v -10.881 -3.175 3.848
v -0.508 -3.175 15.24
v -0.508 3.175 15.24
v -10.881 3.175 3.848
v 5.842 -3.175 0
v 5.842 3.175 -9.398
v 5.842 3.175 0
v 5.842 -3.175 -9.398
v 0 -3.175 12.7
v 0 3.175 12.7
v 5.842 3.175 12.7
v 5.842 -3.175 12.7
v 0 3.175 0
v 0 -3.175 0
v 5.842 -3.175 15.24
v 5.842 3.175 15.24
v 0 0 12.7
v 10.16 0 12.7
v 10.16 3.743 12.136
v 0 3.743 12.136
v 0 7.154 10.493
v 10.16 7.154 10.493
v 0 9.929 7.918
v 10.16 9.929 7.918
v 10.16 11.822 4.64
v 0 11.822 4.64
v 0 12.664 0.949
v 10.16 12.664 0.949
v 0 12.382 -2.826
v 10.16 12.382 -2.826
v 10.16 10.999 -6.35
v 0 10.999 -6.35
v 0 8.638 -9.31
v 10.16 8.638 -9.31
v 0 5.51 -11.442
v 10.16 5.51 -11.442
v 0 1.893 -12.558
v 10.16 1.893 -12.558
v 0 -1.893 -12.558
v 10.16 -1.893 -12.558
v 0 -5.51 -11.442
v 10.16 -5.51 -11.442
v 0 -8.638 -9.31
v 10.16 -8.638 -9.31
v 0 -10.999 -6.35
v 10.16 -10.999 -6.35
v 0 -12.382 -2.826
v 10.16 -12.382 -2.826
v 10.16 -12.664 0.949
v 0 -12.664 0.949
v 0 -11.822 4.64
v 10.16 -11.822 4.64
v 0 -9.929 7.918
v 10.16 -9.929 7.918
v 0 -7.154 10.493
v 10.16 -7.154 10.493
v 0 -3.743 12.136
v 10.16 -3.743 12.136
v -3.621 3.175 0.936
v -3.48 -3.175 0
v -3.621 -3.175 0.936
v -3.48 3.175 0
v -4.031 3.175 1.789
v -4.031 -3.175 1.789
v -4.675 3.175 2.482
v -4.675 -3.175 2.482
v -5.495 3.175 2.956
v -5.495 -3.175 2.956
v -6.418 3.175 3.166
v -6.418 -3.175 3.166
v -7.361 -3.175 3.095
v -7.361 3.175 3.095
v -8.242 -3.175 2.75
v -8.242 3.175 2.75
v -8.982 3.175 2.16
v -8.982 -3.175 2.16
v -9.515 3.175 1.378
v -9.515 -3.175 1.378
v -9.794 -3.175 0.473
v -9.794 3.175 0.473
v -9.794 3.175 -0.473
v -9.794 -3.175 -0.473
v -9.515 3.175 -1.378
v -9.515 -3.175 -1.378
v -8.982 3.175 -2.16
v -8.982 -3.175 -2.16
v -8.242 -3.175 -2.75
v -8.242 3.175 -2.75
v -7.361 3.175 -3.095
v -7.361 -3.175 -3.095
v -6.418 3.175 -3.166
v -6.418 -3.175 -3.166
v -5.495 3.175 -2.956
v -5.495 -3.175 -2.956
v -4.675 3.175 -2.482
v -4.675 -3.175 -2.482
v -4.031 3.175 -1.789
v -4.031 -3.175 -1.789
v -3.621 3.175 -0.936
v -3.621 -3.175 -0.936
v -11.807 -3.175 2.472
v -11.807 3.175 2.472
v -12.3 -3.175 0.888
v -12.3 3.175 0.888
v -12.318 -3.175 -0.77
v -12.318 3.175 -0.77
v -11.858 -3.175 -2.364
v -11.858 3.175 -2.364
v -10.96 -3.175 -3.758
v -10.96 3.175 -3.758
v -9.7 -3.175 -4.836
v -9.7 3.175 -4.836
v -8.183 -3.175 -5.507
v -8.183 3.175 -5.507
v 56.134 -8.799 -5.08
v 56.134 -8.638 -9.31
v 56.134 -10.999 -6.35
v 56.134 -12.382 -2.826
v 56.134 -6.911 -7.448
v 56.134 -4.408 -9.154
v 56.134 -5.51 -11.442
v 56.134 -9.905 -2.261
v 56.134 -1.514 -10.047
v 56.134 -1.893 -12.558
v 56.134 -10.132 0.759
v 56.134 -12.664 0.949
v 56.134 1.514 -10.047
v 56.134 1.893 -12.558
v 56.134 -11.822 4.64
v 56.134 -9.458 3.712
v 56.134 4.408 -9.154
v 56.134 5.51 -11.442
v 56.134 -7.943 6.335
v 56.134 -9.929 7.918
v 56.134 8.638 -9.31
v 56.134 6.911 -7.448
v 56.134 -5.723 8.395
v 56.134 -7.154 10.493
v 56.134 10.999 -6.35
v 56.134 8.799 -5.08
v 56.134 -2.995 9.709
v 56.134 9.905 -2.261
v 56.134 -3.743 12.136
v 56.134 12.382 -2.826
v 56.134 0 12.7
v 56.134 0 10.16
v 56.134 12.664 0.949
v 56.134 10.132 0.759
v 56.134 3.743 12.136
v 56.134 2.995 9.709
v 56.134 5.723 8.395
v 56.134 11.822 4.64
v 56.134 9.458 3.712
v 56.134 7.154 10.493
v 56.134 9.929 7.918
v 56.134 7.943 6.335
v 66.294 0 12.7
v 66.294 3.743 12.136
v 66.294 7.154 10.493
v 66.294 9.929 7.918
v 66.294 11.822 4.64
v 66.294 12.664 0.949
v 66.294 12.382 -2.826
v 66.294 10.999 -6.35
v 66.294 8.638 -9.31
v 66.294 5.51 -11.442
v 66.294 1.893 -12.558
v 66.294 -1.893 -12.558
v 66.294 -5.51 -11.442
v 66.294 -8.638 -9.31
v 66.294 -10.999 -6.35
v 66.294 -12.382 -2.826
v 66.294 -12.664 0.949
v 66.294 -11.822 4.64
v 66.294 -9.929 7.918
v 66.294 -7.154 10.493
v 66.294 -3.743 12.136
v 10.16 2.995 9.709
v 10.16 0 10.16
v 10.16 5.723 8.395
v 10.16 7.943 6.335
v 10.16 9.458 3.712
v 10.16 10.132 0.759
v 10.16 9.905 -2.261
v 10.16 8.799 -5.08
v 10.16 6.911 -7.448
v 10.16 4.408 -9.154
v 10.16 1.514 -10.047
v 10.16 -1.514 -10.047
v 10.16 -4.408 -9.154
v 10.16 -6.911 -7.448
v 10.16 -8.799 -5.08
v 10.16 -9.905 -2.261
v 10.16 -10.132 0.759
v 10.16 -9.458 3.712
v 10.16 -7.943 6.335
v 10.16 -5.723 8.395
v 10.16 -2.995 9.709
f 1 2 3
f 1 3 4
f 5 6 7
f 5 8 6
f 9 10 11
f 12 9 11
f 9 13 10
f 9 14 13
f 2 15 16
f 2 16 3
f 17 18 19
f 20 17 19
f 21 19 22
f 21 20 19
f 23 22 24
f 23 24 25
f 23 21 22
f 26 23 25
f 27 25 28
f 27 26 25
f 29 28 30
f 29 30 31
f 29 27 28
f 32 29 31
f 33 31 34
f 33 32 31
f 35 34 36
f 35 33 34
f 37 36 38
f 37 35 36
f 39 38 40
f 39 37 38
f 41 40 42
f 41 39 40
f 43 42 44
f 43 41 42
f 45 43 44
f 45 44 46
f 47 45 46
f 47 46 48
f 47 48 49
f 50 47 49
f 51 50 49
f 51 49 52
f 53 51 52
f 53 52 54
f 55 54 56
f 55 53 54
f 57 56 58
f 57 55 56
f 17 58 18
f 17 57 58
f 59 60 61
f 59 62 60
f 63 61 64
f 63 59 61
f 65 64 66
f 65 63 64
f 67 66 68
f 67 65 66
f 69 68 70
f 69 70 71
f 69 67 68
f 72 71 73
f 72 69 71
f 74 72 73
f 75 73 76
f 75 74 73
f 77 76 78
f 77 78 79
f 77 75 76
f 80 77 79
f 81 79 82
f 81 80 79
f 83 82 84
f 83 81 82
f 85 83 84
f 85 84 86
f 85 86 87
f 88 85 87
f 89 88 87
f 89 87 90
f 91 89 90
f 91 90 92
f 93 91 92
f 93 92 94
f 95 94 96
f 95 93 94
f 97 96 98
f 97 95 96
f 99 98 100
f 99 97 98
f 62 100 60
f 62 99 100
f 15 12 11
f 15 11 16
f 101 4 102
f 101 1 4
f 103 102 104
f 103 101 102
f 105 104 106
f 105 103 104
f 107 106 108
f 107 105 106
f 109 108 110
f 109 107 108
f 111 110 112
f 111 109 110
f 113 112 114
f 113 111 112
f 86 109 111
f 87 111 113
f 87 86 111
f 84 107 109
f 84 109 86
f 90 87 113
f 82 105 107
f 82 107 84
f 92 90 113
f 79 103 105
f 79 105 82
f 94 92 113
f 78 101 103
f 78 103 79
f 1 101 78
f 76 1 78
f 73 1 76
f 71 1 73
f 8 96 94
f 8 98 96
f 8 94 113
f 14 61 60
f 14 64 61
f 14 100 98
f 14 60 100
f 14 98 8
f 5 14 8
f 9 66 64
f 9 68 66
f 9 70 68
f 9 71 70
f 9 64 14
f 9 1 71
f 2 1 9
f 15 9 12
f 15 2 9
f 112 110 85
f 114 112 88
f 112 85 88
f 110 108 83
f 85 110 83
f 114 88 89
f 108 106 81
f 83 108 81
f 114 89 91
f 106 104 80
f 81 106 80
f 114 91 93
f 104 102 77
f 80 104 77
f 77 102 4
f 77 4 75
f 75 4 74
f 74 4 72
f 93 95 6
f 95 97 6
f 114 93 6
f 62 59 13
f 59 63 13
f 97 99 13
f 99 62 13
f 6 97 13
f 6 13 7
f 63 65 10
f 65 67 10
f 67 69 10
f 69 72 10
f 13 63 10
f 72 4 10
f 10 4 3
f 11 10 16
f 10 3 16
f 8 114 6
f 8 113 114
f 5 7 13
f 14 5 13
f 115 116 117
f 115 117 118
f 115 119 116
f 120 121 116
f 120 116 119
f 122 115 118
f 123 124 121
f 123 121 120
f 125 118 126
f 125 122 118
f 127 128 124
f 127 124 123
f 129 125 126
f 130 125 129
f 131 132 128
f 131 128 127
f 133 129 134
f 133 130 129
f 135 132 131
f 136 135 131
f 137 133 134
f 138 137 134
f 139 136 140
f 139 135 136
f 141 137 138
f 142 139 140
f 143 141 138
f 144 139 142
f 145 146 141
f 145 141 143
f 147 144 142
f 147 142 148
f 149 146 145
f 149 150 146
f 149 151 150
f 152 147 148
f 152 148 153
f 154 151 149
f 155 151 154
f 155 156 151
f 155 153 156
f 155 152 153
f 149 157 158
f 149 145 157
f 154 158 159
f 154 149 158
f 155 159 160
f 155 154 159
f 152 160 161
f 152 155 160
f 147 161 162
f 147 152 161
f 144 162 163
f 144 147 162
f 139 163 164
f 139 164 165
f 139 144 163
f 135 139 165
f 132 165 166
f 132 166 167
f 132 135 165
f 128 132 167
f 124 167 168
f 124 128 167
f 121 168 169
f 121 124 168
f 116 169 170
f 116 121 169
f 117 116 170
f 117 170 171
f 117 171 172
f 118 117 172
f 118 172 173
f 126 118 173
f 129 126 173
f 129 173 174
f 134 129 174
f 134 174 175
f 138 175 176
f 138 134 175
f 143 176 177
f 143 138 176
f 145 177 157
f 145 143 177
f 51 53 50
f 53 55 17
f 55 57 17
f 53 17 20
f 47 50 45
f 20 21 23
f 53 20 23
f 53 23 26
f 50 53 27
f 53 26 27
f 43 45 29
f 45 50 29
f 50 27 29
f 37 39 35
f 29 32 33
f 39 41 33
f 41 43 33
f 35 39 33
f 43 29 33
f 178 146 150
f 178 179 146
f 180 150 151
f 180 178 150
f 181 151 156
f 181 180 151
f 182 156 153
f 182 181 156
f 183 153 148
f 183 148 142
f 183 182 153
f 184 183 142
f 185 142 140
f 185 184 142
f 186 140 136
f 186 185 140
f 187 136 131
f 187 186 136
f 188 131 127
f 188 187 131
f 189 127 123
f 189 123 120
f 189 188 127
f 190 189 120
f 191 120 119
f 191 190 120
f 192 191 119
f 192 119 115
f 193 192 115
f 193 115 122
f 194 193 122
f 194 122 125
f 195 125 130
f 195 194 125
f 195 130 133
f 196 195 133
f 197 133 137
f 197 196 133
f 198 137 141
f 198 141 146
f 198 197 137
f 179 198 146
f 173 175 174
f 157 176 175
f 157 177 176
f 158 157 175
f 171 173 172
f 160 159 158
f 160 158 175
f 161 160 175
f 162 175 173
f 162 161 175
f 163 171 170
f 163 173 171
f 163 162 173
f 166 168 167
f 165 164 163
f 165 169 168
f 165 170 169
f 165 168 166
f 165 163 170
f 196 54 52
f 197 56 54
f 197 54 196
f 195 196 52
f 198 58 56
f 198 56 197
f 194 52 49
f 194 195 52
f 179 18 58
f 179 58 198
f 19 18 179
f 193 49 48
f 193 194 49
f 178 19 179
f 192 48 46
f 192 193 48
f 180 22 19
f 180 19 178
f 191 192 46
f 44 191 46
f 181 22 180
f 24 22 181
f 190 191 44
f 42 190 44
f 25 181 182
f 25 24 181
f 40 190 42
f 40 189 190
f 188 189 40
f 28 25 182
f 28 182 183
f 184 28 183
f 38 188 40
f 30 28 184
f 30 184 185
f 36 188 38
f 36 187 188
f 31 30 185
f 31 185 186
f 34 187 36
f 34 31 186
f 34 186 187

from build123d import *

# Parameters (mm, degrees)
F0_W     = 5.842
F0_H     = 12.7
F0_R     = 3.175
F2_DEPTH = 3.175


with BuildPart() as f1:
    # F0 (on Front) → F1 (revolve)
    with BuildSketch(Plane.XZ):
        with Locations((2.921, 6.35)):
            Rectangle(F0_W, F0_H)
        Polygon((5.842, 12.7), (5.842, 0), (66.294, 0), (66.294, 12.7), (56.134, 12.7), (56.134, 10.16), (10.16, 10.16), (10.16, 12.7), align=None)
    revolve(axis=Axis((33.147, 0, 0), (-1, 0, 0)))


with BuildPart() as f2:
    # F0 (on Front) → F2 (new body, symmetric)
    with BuildSketch(Plane.XZ):
        with BuildLine():
            Line((-0.9398, 0), (0, 0))
            Line((0, 0), (0, 12.7))
            Line((0, 12.7), (5.842, 12.7))
            Line((5.842, 12.7), (5.842, 15.24))
            Line((5.842, 15.24), (-0.508, 15.24))
            Line((-0.508, 15.24), (-10.88063, 3.847543))
            ThreePointArc((-10.88063, 3.847543), (-4.591961, 5.329721), (-0.9398, 0))
        make_face()
        with BuildLine():
            Line((5.842, 0), (0, 0))
            Line((0, 0), (-0.9398, 0))
            ThreePointArc((-0.9398, 0), (-3.195791, -4.549339), (-8.182663, -5.506983))
            Line((-8.182663, -5.506983), (5.842, -9.398))
            Line((5.842, -9.398), (5.842, 0))
        make_face()
        with BuildLine():
            ThreePointArc((-8.182663, -5.506983), (-3.195791, -4.549339), (-0.9398, 0))
            ThreePointArc((-0.9398, 0), (-4.591961, 5.329721), (-10.88063, 3.847543))
            ThreePointArc((-10.88063, 3.847543), (-12.145978, -1.583727), (-8.182663, -5.506983))
        make_face()
        with Locations((-6.6548, 0)):
            Circle(F0_R, mode=Mode.SUBTRACT)
    extrude(amount=F2_DEPTH, both=True)


solid = Compound([f1.part, f2.part])
